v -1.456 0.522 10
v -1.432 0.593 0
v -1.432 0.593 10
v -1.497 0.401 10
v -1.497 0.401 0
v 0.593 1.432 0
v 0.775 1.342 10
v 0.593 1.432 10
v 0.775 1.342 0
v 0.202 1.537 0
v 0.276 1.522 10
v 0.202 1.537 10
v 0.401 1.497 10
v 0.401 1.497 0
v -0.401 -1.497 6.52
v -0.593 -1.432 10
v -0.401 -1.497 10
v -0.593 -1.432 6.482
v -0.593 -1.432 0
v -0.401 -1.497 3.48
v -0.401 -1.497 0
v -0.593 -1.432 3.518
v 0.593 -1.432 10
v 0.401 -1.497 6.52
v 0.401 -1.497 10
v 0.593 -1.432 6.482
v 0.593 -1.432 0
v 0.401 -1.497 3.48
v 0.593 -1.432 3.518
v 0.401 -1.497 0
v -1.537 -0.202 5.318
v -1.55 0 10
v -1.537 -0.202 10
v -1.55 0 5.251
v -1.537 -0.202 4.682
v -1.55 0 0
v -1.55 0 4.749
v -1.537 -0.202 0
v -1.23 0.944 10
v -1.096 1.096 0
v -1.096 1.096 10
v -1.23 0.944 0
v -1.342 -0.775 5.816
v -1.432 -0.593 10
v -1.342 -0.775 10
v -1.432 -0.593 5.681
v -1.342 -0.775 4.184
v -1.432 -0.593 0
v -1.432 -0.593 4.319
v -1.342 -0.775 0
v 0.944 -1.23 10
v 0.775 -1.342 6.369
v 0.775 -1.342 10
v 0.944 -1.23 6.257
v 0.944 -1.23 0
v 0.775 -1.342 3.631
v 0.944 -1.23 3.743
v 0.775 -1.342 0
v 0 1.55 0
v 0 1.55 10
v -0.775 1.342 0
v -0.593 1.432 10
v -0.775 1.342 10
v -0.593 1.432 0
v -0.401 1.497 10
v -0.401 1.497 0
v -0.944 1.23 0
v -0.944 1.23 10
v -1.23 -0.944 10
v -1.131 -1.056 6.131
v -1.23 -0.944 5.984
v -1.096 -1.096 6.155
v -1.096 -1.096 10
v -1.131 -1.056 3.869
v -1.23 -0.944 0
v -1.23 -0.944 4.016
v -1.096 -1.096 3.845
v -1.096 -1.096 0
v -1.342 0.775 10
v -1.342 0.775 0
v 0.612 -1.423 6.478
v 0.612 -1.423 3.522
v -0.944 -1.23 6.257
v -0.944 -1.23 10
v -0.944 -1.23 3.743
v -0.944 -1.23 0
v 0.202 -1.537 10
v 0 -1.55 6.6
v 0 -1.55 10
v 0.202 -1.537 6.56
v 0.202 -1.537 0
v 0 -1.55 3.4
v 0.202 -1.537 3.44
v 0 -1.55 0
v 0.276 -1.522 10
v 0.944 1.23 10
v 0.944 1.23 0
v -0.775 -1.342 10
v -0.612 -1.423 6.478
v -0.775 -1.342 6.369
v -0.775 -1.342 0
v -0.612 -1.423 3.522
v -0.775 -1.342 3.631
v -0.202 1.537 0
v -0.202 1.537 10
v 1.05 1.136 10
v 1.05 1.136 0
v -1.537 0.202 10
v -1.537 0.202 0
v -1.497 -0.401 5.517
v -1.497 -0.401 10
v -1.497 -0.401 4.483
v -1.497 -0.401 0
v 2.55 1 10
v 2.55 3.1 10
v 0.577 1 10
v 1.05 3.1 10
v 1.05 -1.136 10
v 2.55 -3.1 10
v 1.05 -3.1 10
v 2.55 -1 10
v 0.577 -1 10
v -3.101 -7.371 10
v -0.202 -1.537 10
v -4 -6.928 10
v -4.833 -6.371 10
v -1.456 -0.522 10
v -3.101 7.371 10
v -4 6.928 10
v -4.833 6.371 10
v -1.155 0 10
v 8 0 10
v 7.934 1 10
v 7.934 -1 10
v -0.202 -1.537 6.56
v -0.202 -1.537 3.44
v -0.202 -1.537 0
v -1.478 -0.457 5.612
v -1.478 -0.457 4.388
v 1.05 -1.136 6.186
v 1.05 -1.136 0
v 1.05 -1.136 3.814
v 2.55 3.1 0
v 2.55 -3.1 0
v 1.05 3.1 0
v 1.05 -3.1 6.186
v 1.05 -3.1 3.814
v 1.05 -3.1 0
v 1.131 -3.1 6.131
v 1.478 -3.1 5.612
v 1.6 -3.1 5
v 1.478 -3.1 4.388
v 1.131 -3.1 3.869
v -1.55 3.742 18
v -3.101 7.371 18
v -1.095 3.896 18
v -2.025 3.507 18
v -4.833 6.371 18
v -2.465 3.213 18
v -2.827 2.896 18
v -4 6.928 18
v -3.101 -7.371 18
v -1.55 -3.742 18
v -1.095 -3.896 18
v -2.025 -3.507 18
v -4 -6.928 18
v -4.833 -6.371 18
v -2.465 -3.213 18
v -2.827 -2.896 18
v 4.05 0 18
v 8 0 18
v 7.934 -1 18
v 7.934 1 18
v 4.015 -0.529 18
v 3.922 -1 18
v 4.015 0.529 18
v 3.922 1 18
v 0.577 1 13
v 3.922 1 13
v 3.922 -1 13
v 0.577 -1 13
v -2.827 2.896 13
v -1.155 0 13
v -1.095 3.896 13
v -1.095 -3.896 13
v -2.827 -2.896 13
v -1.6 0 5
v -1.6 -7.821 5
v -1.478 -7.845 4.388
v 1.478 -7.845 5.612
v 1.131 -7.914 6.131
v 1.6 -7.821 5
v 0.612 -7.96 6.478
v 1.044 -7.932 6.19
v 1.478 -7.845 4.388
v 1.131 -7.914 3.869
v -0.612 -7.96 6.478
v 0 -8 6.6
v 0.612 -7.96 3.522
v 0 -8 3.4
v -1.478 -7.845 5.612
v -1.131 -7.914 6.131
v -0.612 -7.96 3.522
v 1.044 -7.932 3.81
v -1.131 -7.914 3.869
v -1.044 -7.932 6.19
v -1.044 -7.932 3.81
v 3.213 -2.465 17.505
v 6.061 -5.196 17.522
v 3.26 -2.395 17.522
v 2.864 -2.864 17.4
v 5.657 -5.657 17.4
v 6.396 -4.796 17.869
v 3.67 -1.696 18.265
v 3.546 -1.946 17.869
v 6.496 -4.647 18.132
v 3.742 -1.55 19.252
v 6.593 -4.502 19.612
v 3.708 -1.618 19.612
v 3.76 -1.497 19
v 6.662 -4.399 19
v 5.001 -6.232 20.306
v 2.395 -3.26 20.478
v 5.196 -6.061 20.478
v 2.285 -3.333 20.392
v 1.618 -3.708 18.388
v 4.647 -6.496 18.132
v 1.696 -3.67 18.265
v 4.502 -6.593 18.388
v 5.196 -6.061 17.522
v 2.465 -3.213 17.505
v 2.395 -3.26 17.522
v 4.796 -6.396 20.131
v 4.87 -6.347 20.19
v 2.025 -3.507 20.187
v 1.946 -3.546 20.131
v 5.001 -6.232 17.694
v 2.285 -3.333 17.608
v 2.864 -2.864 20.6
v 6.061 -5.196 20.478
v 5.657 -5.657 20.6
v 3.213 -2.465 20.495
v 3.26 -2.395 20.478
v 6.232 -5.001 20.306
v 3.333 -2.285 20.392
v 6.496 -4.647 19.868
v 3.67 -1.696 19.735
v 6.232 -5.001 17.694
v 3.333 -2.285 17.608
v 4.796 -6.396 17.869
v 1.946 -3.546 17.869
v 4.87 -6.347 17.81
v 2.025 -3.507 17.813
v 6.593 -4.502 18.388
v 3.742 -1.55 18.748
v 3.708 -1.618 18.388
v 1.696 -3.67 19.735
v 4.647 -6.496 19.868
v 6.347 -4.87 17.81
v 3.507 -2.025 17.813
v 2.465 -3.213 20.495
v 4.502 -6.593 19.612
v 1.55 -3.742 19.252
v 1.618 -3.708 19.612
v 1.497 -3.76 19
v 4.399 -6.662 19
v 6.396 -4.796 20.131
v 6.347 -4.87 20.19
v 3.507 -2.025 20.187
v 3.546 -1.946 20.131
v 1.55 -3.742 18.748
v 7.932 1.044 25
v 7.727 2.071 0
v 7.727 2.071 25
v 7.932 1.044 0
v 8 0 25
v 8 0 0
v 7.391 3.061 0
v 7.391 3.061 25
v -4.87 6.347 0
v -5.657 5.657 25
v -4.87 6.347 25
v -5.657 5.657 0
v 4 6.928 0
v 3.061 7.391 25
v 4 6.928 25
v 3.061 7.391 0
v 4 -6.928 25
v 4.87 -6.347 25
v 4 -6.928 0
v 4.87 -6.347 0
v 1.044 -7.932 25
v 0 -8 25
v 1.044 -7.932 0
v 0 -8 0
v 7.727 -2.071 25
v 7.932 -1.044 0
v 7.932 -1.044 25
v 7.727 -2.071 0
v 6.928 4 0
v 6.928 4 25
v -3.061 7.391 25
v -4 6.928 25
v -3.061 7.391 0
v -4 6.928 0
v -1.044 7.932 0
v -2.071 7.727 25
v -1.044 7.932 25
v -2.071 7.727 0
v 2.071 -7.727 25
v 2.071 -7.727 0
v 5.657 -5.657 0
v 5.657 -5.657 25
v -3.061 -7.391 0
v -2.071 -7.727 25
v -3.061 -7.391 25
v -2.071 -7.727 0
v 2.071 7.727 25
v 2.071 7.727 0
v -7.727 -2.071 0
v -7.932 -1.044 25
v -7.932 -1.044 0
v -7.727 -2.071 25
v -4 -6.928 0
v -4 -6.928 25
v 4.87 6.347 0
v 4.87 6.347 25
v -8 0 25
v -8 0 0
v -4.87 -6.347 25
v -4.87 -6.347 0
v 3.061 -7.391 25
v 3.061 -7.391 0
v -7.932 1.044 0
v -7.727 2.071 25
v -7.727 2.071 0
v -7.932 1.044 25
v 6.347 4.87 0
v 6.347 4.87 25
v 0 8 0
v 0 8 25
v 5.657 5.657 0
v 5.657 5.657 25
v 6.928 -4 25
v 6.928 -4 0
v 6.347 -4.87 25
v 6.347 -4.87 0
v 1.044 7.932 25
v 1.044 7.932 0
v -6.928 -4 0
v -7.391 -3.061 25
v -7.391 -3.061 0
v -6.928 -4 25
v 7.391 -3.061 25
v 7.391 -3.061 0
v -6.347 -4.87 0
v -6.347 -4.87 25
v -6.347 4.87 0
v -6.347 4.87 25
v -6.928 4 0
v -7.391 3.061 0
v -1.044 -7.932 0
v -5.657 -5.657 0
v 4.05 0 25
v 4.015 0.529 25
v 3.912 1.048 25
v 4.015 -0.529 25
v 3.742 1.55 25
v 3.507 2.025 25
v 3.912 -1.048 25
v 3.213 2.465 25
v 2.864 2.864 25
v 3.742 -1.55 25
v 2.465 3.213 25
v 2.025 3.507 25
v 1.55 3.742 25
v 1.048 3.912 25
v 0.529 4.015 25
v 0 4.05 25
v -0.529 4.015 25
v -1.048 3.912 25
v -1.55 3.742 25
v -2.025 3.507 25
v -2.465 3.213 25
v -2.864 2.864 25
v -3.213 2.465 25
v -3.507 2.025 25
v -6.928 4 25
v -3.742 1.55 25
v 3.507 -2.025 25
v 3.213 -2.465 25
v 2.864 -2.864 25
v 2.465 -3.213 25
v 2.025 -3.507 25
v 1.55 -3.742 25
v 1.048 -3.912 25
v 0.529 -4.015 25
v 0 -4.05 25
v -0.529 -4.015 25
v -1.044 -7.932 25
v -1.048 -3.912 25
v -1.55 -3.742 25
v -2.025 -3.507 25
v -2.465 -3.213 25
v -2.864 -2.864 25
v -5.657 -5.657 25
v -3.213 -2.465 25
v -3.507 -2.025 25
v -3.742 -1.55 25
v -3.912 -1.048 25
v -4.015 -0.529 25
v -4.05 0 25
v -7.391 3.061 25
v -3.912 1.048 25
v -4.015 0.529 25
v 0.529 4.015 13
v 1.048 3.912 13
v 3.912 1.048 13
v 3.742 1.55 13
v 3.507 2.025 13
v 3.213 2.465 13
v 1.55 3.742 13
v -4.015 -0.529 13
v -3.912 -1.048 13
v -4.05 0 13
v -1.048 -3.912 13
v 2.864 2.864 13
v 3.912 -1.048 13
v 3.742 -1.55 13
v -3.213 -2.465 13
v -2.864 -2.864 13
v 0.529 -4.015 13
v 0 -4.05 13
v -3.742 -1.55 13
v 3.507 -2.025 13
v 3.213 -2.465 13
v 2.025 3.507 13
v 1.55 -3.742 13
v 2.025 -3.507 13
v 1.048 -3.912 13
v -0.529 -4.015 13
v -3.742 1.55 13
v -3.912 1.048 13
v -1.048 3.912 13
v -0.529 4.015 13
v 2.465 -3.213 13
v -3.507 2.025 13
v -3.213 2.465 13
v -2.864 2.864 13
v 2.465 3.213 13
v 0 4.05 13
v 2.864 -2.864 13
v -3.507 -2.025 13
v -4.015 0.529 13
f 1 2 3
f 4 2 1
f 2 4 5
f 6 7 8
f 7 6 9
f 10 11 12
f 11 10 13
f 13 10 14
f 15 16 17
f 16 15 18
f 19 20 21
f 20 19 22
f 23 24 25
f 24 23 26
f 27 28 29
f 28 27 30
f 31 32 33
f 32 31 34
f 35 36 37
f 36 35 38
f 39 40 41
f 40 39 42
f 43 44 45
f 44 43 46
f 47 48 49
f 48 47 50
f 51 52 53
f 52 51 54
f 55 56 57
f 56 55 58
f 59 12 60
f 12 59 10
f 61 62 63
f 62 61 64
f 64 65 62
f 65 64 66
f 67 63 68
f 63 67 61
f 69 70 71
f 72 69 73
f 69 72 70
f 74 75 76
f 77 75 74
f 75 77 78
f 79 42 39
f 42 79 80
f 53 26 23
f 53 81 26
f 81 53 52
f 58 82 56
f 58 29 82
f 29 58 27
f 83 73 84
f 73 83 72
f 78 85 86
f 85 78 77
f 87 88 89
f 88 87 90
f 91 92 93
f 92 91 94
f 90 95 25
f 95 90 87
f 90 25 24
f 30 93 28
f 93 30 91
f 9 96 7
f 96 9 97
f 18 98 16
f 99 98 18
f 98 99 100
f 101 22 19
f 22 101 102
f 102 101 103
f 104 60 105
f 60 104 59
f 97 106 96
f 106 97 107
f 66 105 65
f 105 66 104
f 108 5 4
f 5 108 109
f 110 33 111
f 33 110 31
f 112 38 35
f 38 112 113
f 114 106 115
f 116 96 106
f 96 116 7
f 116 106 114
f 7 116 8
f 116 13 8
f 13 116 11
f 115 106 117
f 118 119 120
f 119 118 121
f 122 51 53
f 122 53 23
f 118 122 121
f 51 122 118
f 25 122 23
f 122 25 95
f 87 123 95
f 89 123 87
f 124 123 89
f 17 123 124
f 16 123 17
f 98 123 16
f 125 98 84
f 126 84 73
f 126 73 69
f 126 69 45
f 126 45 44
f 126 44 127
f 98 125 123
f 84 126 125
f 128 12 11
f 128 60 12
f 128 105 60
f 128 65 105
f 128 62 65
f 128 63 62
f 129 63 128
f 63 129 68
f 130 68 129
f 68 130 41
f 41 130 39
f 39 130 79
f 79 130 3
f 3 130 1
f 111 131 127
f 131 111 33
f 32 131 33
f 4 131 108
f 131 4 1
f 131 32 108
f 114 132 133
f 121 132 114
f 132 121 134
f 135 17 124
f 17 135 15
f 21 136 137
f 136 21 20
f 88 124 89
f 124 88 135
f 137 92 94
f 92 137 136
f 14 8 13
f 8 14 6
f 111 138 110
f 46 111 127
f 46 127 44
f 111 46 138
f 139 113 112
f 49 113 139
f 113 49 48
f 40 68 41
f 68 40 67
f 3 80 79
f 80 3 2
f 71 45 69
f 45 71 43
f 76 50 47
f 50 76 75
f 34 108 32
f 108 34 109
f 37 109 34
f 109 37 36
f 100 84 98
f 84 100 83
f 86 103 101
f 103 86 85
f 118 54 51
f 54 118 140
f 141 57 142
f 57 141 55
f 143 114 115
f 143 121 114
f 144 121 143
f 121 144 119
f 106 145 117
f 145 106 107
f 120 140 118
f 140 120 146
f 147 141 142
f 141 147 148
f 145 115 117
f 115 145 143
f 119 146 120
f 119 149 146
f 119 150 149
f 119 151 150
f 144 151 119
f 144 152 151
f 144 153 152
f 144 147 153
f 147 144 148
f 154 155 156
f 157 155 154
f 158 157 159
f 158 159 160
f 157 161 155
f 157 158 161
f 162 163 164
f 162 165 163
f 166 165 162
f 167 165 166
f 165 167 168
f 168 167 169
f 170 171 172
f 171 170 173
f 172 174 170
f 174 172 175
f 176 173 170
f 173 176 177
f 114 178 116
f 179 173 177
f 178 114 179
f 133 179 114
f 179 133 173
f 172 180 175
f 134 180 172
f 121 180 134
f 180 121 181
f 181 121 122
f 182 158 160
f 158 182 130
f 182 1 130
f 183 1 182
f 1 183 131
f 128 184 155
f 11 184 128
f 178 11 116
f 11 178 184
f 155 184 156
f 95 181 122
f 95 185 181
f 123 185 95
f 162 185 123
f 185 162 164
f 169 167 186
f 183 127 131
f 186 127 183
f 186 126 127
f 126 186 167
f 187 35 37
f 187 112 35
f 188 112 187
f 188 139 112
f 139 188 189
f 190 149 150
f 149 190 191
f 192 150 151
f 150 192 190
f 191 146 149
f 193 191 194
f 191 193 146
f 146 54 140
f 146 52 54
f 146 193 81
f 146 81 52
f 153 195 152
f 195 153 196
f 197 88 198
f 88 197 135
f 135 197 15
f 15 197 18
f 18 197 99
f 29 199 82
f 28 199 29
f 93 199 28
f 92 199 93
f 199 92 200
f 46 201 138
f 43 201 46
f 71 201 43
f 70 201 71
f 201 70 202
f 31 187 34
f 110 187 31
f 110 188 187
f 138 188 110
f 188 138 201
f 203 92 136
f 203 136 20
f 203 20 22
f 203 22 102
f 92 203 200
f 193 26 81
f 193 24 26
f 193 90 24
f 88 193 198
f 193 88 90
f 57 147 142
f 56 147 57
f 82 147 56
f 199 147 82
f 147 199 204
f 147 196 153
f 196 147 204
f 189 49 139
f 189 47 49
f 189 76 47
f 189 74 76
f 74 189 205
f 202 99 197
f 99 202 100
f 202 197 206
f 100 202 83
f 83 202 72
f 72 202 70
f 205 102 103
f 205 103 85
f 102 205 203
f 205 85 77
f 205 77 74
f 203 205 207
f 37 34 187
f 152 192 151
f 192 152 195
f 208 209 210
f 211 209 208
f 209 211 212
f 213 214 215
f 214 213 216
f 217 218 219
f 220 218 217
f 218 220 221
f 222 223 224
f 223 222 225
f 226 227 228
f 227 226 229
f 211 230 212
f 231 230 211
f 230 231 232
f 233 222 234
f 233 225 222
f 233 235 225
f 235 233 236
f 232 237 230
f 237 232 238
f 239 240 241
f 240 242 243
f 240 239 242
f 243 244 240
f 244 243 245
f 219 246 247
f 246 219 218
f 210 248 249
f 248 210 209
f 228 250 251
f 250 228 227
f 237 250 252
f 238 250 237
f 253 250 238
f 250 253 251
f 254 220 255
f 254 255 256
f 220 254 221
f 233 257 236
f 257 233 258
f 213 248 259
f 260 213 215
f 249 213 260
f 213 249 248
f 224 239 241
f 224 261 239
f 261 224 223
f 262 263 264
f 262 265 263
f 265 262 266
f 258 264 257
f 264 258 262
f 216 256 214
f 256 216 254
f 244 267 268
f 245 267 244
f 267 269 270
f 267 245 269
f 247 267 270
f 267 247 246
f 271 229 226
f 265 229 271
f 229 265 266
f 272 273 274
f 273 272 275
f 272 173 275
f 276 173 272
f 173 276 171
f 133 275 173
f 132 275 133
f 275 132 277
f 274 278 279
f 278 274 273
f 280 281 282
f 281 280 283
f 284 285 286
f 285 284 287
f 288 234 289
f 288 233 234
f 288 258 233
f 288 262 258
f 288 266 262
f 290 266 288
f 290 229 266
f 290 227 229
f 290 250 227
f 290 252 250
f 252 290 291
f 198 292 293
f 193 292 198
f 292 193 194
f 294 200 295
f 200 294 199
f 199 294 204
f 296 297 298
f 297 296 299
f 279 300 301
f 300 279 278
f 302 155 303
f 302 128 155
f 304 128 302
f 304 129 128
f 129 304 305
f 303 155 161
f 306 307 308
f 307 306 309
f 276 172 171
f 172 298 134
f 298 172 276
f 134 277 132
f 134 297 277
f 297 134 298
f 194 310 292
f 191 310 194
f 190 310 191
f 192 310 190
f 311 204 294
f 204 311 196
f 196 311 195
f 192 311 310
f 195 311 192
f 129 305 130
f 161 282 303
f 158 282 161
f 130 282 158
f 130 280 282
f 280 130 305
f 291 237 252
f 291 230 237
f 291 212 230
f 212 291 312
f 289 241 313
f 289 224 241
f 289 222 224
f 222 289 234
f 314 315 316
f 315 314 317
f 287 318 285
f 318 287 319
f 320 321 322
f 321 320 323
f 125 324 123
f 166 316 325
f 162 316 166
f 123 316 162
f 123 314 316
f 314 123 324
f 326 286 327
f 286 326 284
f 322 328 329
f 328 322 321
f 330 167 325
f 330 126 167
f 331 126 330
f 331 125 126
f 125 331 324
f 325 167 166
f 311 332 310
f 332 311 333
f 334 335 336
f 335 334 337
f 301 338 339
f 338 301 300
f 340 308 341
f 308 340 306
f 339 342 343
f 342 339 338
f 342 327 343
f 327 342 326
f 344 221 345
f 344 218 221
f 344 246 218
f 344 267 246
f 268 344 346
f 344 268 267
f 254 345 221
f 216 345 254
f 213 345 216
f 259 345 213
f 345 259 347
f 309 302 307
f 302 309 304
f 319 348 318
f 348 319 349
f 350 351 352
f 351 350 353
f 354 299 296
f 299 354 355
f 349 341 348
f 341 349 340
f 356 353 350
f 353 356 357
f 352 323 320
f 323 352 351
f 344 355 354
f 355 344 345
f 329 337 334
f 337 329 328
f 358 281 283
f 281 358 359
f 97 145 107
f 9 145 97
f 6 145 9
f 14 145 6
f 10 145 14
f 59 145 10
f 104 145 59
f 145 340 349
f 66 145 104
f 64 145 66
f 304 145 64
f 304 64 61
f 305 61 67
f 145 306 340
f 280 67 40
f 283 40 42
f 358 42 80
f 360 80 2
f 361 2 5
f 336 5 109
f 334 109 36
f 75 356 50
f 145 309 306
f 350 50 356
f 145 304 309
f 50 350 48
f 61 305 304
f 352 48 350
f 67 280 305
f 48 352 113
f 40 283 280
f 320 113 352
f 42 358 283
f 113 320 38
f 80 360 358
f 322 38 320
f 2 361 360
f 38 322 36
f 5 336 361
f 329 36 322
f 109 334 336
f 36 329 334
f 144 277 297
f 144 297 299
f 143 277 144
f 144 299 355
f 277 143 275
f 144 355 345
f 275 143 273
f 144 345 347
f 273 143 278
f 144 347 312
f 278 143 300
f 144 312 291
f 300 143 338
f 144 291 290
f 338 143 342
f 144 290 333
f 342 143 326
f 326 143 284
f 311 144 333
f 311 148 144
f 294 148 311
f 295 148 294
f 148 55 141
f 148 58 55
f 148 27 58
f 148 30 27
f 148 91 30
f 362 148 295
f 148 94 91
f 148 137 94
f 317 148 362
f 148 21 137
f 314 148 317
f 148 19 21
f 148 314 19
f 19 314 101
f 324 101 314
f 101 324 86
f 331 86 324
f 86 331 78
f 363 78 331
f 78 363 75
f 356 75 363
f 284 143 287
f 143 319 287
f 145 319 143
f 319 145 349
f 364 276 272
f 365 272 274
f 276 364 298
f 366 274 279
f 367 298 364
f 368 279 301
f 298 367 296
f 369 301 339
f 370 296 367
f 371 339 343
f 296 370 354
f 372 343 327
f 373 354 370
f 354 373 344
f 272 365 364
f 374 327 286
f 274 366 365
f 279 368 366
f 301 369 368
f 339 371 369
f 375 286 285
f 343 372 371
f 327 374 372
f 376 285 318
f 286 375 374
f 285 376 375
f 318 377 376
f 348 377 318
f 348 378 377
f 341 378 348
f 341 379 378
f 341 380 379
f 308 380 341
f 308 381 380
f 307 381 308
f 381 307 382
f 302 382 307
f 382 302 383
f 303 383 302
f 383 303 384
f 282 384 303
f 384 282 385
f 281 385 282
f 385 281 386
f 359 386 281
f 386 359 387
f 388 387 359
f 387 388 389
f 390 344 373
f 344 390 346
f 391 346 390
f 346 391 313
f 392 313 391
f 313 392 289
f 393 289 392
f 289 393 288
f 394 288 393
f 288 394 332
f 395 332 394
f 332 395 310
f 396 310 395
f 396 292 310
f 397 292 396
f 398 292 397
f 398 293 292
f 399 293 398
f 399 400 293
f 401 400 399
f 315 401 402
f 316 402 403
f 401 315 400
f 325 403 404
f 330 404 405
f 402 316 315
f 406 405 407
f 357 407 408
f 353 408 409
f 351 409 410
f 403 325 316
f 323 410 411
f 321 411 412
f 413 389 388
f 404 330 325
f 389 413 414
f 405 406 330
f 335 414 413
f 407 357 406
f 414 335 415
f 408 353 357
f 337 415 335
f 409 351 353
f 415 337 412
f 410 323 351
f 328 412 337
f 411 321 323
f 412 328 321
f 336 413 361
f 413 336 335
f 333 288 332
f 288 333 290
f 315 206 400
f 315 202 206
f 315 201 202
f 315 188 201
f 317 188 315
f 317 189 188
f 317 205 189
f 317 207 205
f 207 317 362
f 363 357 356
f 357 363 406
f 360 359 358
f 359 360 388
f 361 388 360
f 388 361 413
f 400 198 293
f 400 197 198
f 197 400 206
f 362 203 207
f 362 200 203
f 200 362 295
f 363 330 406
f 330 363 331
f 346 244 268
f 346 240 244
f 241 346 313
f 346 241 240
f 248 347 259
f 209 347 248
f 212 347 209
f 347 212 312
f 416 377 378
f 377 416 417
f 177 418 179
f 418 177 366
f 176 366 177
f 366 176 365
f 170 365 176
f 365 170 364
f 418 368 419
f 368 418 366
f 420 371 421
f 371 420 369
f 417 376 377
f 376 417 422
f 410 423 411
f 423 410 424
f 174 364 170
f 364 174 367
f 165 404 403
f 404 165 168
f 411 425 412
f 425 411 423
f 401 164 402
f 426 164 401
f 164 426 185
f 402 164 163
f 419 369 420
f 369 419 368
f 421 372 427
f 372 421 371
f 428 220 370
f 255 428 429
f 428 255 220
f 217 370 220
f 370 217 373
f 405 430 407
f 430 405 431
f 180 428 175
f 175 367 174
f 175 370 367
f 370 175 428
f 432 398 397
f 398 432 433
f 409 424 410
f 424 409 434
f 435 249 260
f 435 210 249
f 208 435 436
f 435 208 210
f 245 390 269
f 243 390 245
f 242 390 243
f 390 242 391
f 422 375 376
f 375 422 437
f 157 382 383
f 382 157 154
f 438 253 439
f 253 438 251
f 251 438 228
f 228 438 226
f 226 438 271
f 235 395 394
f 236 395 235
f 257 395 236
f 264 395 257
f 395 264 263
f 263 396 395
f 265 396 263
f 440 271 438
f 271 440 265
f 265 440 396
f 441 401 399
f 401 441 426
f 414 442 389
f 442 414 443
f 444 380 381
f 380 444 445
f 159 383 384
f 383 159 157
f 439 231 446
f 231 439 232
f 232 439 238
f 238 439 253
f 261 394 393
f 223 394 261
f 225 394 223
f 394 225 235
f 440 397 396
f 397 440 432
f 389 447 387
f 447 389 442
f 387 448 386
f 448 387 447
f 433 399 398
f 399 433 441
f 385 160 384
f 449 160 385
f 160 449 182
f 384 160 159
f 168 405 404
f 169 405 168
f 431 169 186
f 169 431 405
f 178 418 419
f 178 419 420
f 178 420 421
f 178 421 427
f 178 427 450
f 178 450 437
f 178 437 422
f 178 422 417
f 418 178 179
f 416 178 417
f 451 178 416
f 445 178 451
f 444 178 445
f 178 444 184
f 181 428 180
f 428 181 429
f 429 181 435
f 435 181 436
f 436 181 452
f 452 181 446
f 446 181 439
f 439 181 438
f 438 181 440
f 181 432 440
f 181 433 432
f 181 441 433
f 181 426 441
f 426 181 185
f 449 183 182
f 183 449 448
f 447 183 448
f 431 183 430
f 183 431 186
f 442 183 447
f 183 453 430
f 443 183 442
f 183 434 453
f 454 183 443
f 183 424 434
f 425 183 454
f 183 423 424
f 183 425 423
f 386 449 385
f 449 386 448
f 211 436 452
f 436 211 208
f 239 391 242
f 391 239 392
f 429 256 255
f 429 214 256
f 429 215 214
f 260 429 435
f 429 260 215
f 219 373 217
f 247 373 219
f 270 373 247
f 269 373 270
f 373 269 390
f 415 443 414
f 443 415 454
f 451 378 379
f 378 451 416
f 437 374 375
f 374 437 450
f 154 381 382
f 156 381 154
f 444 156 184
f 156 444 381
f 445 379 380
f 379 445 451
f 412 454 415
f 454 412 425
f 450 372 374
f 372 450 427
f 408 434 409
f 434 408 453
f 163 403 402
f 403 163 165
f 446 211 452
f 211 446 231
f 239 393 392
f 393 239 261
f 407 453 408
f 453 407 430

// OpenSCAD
// file: ../common.scad
/*
 * WAVE OCEAN V10 - COMMON PARAMETERS
 *
 * Shared constants, tolerances, and hardware specifications
 * All dimensions in mm
 *
 * MECHANISM: Helical groove cam drives 24 slats via follower arms
 * - Worm rotates around X axis
 * - Groove follows helix at radius GROOVE_RADIUS
 * - Follower rollers ride in groove, push slats up/down
 * - Phase difference along X creates traveling wave illusion
 */

// ============================================
// PRINT TOLERANCES (tune for your printer)
// ============================================

TOL_CLEARANCE = 0.2;         // Shaft in hole clearance
TOL_PRESS_FIT = -0.15;       // Bearing press-fit interference
TOL_SLIDING = 0.4;           // Sliding fit (guide slots)
TOL_SCREW_HOLE = 0.2;        // Screw hole clearance

// ============================================
// HARDWARE - BEARINGS
// ============================================

// 608 bearing (worm shaft)
BEARING_608_ID = 8;
BEARING_608_OD = 22;
BEARING_608_H = 7;

// 624 bearing (follower rollers)
BEARING_624_ID = 4;
BEARING_624_OD = 13;
BEARING_624_H = 5;

// ============================================
// HARDWARE - FASTENERS
// ============================================

M3_HOLE_DIA = 3 + TOL_SCREW_HOLE;      // 3.2mm
M3_HEAD_DIA = 5.5;
M3_HEAD_H = 3;
M3_NUT_FLAT = 5.5;
M3_NUT_H = 2.4;
M3_INSERT_DIA = 4.0;                    // Heat-set insert hole
M3_INSERT_DEPTH = 5;

// ============================================
// HARDWARE - SHAFTS AND PINS
// ============================================

WORM_SHAFT_DIA = 8;
WORM_SHAFT_LENGTH = 280;               // Extends beyond worm for bearings

ROLLER_AXLE_DIA = 4;
ROLLER_AXLE_LENGTH = 12;

PIVOT_PIN_DIA = 3;
PIVOT_PIN_LENGTH = 15;

// ============================================
// WORM CAM DIMENSIONS
// ============================================

WORM_LENGTH = 200;
WORM_OUTER_RADIUS = 20;              // 40mm diameter (bigger for deeper groove)
WORM_CORE_RADIUS = 10;               // 20mm diameter core
WORM_SHAFT_HOLE = WORM_SHAFT_DIA + TOL_CLEARANCE;  // 8.2mm

// Groove sized to contain 624 bearing roller
GROOVE_WIDTH = BEARING_624_H + 2;    // 7mm wide (bearing + clearance)
GROOVE_DEPTH = BEARING_624_OD/2 + 3; // 9.5mm deep (half bearing + margin)
GROOVE_RADIUS = WORM_OUTER_RADIUS - GROOVE_DEPTH/2;  // ~15mm from center

HELIX_PITCH = 25;                    // 25mm per rotation = 8 turns over 200mm

// ============================================
// SLAT DIMENSIONS
// ============================================

NUM_SLATS = 24;
SLAT_SPACING = WORM_LENGTH / NUM_SLATS;  // 8.33mm

SLAT_WIDTH = 5;                       // X dimension (slightly wider)
SLAT_DEPTH = 30;                      // Y dimension (narrower)
SLAT_HEIGHT = 40;                     // Z dimension

// Wave motion amplitude (half of total travel)
WAVE_AMPLITUDE = 10;                  // ±10mm vertical motion

// ============================================
// FOLLOWER ARM DIMENSIONS
// ============================================

ARM_LENGTH = 35;                      // Pivot to roller center (LONGER)
ARM_WIDTH = 8;
ARM_THICKNESS = 6;

PIVOT_HOLE = PIVOT_PIN_DIA + TOL_CLEARANCE;    // 3.2mm
ROLLER_AXLE_HOLE = ROLLER_AXLE_DIA + TOL_CLEARANCE;  // 4.2mm

// ============================================
// SLAT BRACKET DIMENSIONS
// ============================================

BRACKET_WIDTH = 12;
BRACKET_DEPTH = 20;
BRACKET_HEIGHT = 25;

// ============================================
// GUIDE RAIL DIMENSIONS
// ============================================

GUIDE_LENGTH = 210;
GUIDE_HEIGHT = 30;                    // Taller for more travel
GUIDE_DEPTH = 10;
GUIDE_WALL = 3;

SLOT_WIDTH = SLAT_WIDTH + TOL_SLIDING;   // Slat slides in slot, not bracket tab
SLOT_HEIGHT = WAVE_AMPLITUDE * 2 + 10;   // Allow full travel + margin

// ============================================
// BEARING BLOCK DIMENSIONS
// ============================================

BEARING_BLOCK_WIDTH = 35;
BEARING_BLOCK_DEPTH = 35;
BEARING_BLOCK_HEIGHT = 30;

BEARING_POCKET_DIA = BEARING_608_OD + TOL_PRESS_FIT;  // 21.85mm
BEARING_POCKET_DEPTH = BEARING_608_H + 1;             // 8mm

// ============================================
// BASE PLATE DIMENSIONS
// ============================================

BASE_LENGTH = 280;                    // Longer to fit everything
BASE_WIDTH = 100;                     // Wider for stability
BASE_THICKNESS = 5;

// ============================================
// MOTOR MOUNT DIMENSIONS
// ============================================

N20_BODY_DIA = 12;
N20_BODY_LENGTH = 15;
N20_GEARBOX_DIA = 10;
N20_GEARBOX_LENGTH = 12;
N20_SHAFT_DIA = 3;
N20_SHAFT_LENGTH = 10;

// ============================================
// ASSEMBLY POSITIONS
// ============================================

// Worm center position
// Shaft runs along X axis at this Z height
WORM_CENTER_Z = BASE_THICKNESS + BEARING_BLOCK_HEIGHT;  // 35mm

// Guide rail positions (front and back of slats)
// Slats are centered at Y=0, spanning ±SLAT_DEPTH/2
GUIDE_FRONT_Y = -SLAT_DEPTH/2 - GUIDE_DEPTH/2;   // -20
GUIDE_BACK_Y = SLAT_DEPTH/2 + GUIDE_DEPTH/2;     // +20

// Guide rail Z - slats hang down from here
// Positioned so slat bottom can reach groove at top of worm
GUIDE_Z = WORM_CENTER_Z + WORM_OUTER_RADIUS + SLAT_HEIGHT/2 + 5;  // 80mm

// Bearing block X positions (at ends of worm, inward facing)
BEARING_L_X = -WORM_LENGTH/2 - BEARING_BLOCK_WIDTH/2;   // -117.5
BEARING_R_X = WORM_LENGTH/2 + BEARING_BLOCK_WIDTH/2;    // +117.5

// Motor mount X position (beyond right bearing block)
MOTOR_MOUNT_X = BEARING_R_X + BEARING_BLOCK_WIDTH/2 + 30;

// ============================================
// COLORS (for assembly visualization)
// ============================================

C_WORM = [0.75, 0.55, 0.2];
C_SLAT = [0.2, 0.45, 0.75];
C_BRACKET = [0.4, 0.4, 0.45];
C_ARM = [0.5, 0.5, 0.55];
C_GUIDE = [0.35, 0.35, 0.4];
C_BEARING_BLOCK = [0.3, 0.35, 0.4];
C_BASE = [0.25, 0.25, 0.3];
C_SHAFT = [0.6, 0.6, 0.65];
C_BEARING = [0.7, 0.7, 0.75];
C_MOTOR = [0.3, 0.3, 0.35];

// ============================================
// HELPER FUNCTIONS
// ============================================

// Helix angle at position X along worm (in degrees)
function helix_angle(x) = (x / HELIX_PITCH) * 360;

// Combined phase: helix position + shaft rotation
function phase(x, theta) = helix_angle(x) + theta;

// Groove center position in Y-Z plane (polar coordinates from shaft)
// Y = radius * sin(angle), Z = center + radius * cos(angle)
function groove_y(x, theta) = GROOVE_RADIUS * sin(phase(x, theta));
function groove_z(x, theta) = WORM_CENTER_Z + GROOVE_RADIUS * cos(phase(x, theta));

// Slat X position (evenly spaced along worm length)
function slat_x(i) = i * SLAT_SPACING - WORM_LENGTH/2 + SLAT_SPACING/2;

// Slat Z position - follows groove Z position via follower arm
// When groove is at top (cos=1), slat is pushed up
// When groove is at bottom (cos=-1), slat drops down
function slat_z(i, theta) =
    let(x = slat_x(i))
    GUIDE_Z + GROOVE_RADIUS * cos(phase(x, theta)) - GROOVE_RADIUS;

// ============================================
// CLEARANCE VERIFICATION
// ============================================

// Slat gap: SLAT_SPACING - SLAT_WIDTH = 8.33 - 5 = 3.33mm ✓
// Arm reach: ARM_LENGTH = 35mm, needs to reach ~30mm ✓
// Groove depth: 9.5mm, bearing radius 6.5mm ✓
// Wave travel: ±GROOVE_RADIUS * cos variation = ±15mm

// ============================================
// QUALITY SETTINGS
// ============================================

$fn = 48;  // Default facets
// main file
/*
 * SHAFT COUPLER - 3mm Motor Shaft to 8mm Worm Shaft
 *
 * Printable part: 1x
 * Print orientation: Standing (coupler axis vertical)
 *
 * Features:
 * - 3mm D-shaft bore (motor side)
 * - 8mm bore with set screw (worm shaft side)
 * - Flexible section for misalignment
 */

include <../common.scad>

$fn = 48;

// ============================================
// COUPLER PARAMETERS
// ============================================

COUPLER_OD = 16;
COUPLER_LENGTH = 25;

MOTOR_BORE = 3.1;            // 3mm + clearance
MOTOR_BORE_DEPTH = 10;
MOTOR_D_FLAT = 0.5;          // D-shaft flat depth

WORM_BORE = 8.1;             // 8mm + clearance
WORM_BORE_DEPTH = 12;

FLEX_SLOTS = 3;              // Number of flex slots
FLEX_DEPTH = 8;              // How deep slots cut

// ============================================
// MAIN COUPLER MODULE
// ============================================

module shaft_coupler() {
    difference() {
        // Main body
        coupler_body();

        // Motor bore (3mm D-shaft)
        motor_bore();

        // Worm bore (8mm)
        worm_bore();

        // Flex slots
        flex_slots();

        // Set screws
        set_screws();
    }
}

// ============================================
// COUPLER BODY
// ============================================

module coupler_body() {
    cylinder(d=COUPLER_OD, h=COUPLER_LENGTH);
}

// ============================================
// BORES
// ============================================

module motor_bore() {
    // 3mm bore from bottom
    translate([0, 0, -1])
        cylinder(d=MOTOR_BORE, h=MOTOR_BORE_DEPTH + 1);

    // D-shaft flat
    translate([MOTOR_BORE/2 - MOTOR_D_FLAT, -MOTOR_BORE, -1])
        cube([MOTOR_D_FLAT + 1, MOTOR_BORE * 2, MOTOR_BORE_DEPTH + 1]);
}

module worm_bore() {
    // 8mm bore from top
    translate([0, 0, COUPLER_LENGTH - WORM_BORE_DEPTH])
        cylinder(d=WORM_BORE, h=WORM_BORE_DEPTH + 1);
}

// ============================================
// FLEX SLOTS
// ============================================

module flex_slots() {
    // Helical slots for flexibility
    slot_width = 2;

    for (i = [0 : FLEX_SLOTS - 1]) {
        angle = i * 360 / FLEX_SLOTS;

        rotate([0, 0, angle])
        translate([0, -slot_width/2, MOTOR_BORE_DEPTH])
            cube([COUPLER_OD, slot_width, FLEX_DEPTH]);
    }
}

// ============================================
// SET SCREWS
// ============================================

module set_screws() {
    // Motor side set screw
    translate([0, 0, MOTOR_BORE_DEPTH/2])
    rotate([90, 0, 0])
        cylinder(d=M3_HOLE_DIA, h=COUPLER_OD, $fn=16);

    // Worm side set screw
    translate([0, 0, COUPLER_LENGTH - WORM_BORE_DEPTH/2])
    rotate([90, 0, 45])
        cylinder(d=M3_HOLE_DIA, h=COUPLER_OD, $fn=16);
}

// ============================================
// RENDER
// ============================================

color([0.5, 0.5, 0.55])
shaft_coupler();

// ============================================
// INFO
// ============================================

echo("=== SHAFT COUPLER ===");
echo(str("OD: ", COUPLER_OD, "mm"));
echo(str("Length: ", COUPLER_LENGTH, "mm"));
echo(str("Motor bore: ", MOTOR_BORE, "mm (D-shaft)"));
echo(str("Worm bore: ", WORM_BORE, "mm"));
echo("");
echo("Print quantity: 1");
echo("Print orientation: Vertical (standing)");
echo("Material: PETG or ABS recommended for flexibility");
